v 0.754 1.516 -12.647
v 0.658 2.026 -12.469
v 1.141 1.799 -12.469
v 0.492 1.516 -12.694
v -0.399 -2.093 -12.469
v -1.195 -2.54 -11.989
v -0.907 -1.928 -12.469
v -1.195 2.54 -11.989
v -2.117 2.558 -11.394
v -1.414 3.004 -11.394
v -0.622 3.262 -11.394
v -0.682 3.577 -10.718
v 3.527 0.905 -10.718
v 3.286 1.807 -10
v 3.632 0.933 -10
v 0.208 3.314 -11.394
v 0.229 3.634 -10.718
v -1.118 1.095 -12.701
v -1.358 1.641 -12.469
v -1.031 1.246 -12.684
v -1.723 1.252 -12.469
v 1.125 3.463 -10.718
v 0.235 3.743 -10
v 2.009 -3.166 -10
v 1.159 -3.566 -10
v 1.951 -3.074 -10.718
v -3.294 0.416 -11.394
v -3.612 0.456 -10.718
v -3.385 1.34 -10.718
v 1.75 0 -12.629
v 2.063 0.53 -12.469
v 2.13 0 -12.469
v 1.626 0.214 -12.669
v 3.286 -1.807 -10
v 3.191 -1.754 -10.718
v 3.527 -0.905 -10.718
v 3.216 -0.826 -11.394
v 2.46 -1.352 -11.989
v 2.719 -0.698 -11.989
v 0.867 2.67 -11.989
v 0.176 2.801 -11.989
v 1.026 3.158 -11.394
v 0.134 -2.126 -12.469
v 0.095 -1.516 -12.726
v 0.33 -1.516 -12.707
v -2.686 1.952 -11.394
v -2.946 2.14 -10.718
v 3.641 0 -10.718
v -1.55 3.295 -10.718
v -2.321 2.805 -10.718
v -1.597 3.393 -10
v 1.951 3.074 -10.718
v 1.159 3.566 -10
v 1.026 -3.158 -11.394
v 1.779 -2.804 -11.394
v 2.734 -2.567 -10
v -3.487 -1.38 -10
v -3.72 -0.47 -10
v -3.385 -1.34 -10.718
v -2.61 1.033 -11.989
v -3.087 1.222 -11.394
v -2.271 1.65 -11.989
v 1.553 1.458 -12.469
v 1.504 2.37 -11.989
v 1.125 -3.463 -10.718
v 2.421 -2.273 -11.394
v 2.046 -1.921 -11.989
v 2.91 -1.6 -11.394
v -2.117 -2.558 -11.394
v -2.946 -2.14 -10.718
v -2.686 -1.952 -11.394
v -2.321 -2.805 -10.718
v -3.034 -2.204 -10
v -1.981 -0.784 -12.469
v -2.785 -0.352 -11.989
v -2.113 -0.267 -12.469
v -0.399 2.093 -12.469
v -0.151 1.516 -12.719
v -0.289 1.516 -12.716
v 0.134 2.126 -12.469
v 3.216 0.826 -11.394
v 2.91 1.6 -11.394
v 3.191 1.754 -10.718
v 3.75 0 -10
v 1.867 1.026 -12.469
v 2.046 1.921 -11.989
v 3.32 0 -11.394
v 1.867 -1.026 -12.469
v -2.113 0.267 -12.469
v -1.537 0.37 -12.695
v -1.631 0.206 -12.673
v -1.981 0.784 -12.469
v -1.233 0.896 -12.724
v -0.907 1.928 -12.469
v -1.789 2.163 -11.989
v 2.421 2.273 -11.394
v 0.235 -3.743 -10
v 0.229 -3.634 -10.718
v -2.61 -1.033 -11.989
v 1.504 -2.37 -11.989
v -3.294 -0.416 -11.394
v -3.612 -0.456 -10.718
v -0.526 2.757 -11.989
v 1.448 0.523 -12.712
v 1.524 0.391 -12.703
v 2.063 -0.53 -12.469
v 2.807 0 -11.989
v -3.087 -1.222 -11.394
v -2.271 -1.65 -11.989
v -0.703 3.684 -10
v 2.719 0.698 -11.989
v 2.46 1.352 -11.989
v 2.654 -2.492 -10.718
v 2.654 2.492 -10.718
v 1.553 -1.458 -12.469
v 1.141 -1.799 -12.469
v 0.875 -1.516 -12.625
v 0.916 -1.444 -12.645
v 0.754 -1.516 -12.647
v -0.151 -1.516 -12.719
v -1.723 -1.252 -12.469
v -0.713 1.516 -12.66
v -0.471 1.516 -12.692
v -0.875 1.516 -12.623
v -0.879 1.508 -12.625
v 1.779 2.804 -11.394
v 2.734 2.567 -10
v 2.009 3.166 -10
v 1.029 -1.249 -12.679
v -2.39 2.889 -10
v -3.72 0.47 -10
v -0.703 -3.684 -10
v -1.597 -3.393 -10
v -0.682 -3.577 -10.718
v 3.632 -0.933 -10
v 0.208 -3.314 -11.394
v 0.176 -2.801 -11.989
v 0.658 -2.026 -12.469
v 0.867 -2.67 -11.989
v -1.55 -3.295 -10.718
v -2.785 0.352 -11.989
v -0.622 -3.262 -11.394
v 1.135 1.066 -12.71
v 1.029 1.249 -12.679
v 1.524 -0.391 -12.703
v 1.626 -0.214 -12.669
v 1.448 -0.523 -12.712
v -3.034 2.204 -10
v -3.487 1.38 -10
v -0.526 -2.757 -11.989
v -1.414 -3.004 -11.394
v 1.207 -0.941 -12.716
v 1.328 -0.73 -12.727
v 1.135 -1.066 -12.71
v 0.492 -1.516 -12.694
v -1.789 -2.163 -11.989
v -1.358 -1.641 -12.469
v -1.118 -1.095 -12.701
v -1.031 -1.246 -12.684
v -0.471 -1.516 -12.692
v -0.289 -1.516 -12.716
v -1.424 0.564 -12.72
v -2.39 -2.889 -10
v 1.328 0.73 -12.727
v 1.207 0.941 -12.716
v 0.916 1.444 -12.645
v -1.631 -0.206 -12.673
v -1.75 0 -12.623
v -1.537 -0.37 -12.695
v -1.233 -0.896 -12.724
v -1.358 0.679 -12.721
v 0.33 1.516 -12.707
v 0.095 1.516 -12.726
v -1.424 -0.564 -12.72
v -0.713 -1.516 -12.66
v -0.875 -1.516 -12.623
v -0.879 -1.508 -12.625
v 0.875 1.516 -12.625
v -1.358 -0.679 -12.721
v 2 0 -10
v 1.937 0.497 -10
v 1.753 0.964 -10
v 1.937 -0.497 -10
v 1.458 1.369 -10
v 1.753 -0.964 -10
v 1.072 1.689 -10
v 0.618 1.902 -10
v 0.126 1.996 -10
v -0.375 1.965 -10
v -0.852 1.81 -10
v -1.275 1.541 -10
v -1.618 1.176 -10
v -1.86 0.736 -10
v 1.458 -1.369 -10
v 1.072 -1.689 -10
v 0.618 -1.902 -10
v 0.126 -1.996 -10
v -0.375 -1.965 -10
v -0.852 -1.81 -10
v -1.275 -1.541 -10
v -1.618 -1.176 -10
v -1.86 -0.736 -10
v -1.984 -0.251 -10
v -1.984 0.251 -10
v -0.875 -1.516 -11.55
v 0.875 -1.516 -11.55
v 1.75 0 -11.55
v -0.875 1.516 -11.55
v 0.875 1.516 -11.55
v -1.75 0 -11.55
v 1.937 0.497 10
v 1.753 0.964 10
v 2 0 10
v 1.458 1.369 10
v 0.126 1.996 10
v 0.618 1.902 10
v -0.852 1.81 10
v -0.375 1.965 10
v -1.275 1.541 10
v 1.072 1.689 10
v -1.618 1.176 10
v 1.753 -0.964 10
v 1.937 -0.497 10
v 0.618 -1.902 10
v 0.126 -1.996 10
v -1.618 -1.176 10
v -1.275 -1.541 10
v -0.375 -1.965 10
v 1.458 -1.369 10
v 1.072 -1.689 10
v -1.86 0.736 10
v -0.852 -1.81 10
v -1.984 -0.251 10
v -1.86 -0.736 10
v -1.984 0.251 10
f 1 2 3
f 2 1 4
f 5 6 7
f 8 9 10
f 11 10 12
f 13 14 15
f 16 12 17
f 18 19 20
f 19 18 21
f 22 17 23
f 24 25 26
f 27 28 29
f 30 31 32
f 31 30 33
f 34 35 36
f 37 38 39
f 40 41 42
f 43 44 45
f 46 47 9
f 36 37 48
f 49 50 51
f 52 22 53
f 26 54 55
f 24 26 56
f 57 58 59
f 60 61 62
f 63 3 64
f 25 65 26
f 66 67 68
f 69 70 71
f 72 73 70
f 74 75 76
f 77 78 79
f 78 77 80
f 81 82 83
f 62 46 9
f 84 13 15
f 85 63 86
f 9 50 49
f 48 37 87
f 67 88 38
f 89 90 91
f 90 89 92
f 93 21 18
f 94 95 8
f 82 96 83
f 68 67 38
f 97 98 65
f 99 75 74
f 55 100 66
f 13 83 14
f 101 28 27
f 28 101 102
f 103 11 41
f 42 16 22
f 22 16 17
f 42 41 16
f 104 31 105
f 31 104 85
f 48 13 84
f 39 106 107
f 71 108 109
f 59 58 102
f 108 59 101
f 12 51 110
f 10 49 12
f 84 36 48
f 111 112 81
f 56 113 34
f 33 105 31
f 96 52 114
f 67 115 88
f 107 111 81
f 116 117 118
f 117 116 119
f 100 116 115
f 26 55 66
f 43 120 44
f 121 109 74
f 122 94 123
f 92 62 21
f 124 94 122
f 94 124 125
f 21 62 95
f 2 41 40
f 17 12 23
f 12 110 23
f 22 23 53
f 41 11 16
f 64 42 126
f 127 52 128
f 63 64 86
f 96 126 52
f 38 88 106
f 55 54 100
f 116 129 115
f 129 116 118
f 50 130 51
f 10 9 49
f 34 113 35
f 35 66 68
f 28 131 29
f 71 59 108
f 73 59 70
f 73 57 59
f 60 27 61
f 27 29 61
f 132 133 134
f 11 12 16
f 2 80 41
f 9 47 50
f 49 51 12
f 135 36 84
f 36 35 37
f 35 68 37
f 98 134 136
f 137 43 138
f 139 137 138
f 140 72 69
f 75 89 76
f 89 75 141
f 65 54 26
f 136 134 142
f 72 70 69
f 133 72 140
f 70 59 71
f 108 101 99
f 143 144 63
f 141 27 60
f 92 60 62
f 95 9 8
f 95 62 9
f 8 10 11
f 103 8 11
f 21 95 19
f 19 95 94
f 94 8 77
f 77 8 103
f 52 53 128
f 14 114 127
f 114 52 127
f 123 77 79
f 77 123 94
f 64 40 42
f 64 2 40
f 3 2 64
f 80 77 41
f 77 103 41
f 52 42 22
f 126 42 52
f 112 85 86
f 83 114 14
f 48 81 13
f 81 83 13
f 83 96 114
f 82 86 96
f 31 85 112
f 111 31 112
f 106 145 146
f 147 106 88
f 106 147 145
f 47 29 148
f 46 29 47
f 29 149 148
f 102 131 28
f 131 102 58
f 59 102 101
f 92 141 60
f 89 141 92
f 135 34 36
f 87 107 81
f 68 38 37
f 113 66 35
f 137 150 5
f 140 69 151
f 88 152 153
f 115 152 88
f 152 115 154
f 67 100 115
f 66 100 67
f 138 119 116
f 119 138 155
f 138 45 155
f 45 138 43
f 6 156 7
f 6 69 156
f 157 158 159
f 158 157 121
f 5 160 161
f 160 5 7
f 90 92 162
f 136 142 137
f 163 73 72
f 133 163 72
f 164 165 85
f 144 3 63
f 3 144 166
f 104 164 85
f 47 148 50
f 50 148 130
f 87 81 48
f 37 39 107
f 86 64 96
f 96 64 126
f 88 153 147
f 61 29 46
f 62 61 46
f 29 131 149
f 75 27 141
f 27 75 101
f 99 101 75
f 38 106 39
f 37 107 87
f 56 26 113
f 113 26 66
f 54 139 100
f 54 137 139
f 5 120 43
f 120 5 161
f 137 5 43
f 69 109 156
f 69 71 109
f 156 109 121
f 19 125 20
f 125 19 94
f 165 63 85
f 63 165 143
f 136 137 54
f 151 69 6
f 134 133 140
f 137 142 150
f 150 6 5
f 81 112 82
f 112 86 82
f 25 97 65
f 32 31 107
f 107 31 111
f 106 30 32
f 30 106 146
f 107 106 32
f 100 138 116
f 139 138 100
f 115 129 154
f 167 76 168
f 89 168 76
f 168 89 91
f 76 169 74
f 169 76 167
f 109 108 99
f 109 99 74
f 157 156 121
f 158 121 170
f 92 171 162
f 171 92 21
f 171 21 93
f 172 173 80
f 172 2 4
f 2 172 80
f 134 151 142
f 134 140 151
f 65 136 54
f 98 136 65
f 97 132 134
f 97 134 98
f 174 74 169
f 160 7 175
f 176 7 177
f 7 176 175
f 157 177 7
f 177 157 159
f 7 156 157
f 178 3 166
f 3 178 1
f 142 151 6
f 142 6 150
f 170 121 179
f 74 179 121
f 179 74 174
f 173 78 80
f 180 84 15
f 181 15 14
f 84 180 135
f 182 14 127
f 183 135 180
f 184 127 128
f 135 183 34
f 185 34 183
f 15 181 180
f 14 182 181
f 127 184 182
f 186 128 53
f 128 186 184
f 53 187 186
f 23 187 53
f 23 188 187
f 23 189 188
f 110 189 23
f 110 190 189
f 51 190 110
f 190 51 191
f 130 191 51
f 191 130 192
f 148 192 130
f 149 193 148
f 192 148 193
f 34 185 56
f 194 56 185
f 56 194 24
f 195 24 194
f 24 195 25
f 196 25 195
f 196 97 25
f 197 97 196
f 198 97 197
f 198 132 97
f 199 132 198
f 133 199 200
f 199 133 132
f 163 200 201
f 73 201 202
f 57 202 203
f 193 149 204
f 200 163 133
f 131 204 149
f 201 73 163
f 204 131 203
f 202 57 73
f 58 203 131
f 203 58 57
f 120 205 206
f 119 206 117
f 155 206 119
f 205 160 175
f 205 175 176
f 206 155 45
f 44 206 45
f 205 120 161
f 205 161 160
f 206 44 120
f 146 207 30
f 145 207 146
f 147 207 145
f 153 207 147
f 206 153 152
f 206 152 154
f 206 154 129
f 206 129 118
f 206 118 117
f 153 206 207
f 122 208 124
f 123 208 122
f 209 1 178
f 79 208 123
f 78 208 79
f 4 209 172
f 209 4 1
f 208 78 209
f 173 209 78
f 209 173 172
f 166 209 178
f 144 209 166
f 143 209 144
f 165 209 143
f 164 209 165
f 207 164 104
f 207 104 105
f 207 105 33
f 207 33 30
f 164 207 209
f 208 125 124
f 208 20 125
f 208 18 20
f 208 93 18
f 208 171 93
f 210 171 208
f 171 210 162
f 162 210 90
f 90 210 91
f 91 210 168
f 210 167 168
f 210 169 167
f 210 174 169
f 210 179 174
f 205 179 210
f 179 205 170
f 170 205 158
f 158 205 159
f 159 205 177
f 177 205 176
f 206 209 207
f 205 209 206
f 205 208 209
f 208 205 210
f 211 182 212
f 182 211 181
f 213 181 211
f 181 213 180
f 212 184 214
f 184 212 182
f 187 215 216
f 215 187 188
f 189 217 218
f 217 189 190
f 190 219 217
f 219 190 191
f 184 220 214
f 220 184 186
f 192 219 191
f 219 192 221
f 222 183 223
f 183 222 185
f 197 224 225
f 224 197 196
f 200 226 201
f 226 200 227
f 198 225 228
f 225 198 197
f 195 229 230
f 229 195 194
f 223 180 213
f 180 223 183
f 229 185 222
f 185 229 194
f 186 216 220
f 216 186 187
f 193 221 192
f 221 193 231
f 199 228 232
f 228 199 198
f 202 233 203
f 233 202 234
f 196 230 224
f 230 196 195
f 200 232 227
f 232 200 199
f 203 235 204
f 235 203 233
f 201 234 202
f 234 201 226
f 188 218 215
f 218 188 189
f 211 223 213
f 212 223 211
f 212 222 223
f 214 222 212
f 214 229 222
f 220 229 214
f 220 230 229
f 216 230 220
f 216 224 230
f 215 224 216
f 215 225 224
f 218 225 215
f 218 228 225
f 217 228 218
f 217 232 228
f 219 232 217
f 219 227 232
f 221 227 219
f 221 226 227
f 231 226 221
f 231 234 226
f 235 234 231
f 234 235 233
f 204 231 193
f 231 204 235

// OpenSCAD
// file: lib/screw_nuts.scad
$fn=25;

module screw_m3(h=20, button=false){
    cylinder(d=3, h=h, center=true);
    translate([0, 0, -h/2-1.5])
        difference(){
            cylinder(d=5.5, h=3, center=true);
            translate([0, 0, -0.8])
                cylinder(d=2.8, h=1.8, $fn=6, center=true);
        }
}

module screw_m4(h=20, button=false){
    cylinder(d=4, h=h, center=true);
    translate([0, 0, -h/2-2])
        difference(){
            if (button) {
                translate([0, 0, 2])
                    scale([1, 1, 6/7.5])
                    sphere(d=7.5);
            } else {
                cylinder(d=7, h=4, center=true);
            }
            if (button) {
                 translate([0, 0, 5])
                    cube([7.6, 7.6, 6], center=true);
            }
            translate([0, 0, -0.8])
                cylinder(d=3.5, h=2.5, $fn=6, center=true);
        }
}

module nut_m3(){
    difference(){
        cylinder(d=6, h=2.4, $fn=6);
        translate([0, 0, -0.05])
            cylinder(d=3, h=2.5);
    }
}

module nut_m4(){
    difference(){
        cylinder(d=7.6, h=3.2, $fn=6);
        translate([0, 0, -0.05])
            cylinder(d=4, h=3.3);
    }
}

module washer_m3(h){
    difference(){
        cylinder(d=8, h=h, center=true);
        cylinder(d=3.4, h=h+0.1, center=true);
    }
}

module washer_m5(h){
    difference(){
        cylinder(d=8, h=h, center=true);
        cylinder(d=5.4, h=h+0.1, center=true);
    }
}
// main file
// NAME: Screw M4x20 Button
// COLOR: 80
// CATEGORY: Support

include <lib/screw_nuts.scad>

color("silver")
    screw_m4(20, true);
